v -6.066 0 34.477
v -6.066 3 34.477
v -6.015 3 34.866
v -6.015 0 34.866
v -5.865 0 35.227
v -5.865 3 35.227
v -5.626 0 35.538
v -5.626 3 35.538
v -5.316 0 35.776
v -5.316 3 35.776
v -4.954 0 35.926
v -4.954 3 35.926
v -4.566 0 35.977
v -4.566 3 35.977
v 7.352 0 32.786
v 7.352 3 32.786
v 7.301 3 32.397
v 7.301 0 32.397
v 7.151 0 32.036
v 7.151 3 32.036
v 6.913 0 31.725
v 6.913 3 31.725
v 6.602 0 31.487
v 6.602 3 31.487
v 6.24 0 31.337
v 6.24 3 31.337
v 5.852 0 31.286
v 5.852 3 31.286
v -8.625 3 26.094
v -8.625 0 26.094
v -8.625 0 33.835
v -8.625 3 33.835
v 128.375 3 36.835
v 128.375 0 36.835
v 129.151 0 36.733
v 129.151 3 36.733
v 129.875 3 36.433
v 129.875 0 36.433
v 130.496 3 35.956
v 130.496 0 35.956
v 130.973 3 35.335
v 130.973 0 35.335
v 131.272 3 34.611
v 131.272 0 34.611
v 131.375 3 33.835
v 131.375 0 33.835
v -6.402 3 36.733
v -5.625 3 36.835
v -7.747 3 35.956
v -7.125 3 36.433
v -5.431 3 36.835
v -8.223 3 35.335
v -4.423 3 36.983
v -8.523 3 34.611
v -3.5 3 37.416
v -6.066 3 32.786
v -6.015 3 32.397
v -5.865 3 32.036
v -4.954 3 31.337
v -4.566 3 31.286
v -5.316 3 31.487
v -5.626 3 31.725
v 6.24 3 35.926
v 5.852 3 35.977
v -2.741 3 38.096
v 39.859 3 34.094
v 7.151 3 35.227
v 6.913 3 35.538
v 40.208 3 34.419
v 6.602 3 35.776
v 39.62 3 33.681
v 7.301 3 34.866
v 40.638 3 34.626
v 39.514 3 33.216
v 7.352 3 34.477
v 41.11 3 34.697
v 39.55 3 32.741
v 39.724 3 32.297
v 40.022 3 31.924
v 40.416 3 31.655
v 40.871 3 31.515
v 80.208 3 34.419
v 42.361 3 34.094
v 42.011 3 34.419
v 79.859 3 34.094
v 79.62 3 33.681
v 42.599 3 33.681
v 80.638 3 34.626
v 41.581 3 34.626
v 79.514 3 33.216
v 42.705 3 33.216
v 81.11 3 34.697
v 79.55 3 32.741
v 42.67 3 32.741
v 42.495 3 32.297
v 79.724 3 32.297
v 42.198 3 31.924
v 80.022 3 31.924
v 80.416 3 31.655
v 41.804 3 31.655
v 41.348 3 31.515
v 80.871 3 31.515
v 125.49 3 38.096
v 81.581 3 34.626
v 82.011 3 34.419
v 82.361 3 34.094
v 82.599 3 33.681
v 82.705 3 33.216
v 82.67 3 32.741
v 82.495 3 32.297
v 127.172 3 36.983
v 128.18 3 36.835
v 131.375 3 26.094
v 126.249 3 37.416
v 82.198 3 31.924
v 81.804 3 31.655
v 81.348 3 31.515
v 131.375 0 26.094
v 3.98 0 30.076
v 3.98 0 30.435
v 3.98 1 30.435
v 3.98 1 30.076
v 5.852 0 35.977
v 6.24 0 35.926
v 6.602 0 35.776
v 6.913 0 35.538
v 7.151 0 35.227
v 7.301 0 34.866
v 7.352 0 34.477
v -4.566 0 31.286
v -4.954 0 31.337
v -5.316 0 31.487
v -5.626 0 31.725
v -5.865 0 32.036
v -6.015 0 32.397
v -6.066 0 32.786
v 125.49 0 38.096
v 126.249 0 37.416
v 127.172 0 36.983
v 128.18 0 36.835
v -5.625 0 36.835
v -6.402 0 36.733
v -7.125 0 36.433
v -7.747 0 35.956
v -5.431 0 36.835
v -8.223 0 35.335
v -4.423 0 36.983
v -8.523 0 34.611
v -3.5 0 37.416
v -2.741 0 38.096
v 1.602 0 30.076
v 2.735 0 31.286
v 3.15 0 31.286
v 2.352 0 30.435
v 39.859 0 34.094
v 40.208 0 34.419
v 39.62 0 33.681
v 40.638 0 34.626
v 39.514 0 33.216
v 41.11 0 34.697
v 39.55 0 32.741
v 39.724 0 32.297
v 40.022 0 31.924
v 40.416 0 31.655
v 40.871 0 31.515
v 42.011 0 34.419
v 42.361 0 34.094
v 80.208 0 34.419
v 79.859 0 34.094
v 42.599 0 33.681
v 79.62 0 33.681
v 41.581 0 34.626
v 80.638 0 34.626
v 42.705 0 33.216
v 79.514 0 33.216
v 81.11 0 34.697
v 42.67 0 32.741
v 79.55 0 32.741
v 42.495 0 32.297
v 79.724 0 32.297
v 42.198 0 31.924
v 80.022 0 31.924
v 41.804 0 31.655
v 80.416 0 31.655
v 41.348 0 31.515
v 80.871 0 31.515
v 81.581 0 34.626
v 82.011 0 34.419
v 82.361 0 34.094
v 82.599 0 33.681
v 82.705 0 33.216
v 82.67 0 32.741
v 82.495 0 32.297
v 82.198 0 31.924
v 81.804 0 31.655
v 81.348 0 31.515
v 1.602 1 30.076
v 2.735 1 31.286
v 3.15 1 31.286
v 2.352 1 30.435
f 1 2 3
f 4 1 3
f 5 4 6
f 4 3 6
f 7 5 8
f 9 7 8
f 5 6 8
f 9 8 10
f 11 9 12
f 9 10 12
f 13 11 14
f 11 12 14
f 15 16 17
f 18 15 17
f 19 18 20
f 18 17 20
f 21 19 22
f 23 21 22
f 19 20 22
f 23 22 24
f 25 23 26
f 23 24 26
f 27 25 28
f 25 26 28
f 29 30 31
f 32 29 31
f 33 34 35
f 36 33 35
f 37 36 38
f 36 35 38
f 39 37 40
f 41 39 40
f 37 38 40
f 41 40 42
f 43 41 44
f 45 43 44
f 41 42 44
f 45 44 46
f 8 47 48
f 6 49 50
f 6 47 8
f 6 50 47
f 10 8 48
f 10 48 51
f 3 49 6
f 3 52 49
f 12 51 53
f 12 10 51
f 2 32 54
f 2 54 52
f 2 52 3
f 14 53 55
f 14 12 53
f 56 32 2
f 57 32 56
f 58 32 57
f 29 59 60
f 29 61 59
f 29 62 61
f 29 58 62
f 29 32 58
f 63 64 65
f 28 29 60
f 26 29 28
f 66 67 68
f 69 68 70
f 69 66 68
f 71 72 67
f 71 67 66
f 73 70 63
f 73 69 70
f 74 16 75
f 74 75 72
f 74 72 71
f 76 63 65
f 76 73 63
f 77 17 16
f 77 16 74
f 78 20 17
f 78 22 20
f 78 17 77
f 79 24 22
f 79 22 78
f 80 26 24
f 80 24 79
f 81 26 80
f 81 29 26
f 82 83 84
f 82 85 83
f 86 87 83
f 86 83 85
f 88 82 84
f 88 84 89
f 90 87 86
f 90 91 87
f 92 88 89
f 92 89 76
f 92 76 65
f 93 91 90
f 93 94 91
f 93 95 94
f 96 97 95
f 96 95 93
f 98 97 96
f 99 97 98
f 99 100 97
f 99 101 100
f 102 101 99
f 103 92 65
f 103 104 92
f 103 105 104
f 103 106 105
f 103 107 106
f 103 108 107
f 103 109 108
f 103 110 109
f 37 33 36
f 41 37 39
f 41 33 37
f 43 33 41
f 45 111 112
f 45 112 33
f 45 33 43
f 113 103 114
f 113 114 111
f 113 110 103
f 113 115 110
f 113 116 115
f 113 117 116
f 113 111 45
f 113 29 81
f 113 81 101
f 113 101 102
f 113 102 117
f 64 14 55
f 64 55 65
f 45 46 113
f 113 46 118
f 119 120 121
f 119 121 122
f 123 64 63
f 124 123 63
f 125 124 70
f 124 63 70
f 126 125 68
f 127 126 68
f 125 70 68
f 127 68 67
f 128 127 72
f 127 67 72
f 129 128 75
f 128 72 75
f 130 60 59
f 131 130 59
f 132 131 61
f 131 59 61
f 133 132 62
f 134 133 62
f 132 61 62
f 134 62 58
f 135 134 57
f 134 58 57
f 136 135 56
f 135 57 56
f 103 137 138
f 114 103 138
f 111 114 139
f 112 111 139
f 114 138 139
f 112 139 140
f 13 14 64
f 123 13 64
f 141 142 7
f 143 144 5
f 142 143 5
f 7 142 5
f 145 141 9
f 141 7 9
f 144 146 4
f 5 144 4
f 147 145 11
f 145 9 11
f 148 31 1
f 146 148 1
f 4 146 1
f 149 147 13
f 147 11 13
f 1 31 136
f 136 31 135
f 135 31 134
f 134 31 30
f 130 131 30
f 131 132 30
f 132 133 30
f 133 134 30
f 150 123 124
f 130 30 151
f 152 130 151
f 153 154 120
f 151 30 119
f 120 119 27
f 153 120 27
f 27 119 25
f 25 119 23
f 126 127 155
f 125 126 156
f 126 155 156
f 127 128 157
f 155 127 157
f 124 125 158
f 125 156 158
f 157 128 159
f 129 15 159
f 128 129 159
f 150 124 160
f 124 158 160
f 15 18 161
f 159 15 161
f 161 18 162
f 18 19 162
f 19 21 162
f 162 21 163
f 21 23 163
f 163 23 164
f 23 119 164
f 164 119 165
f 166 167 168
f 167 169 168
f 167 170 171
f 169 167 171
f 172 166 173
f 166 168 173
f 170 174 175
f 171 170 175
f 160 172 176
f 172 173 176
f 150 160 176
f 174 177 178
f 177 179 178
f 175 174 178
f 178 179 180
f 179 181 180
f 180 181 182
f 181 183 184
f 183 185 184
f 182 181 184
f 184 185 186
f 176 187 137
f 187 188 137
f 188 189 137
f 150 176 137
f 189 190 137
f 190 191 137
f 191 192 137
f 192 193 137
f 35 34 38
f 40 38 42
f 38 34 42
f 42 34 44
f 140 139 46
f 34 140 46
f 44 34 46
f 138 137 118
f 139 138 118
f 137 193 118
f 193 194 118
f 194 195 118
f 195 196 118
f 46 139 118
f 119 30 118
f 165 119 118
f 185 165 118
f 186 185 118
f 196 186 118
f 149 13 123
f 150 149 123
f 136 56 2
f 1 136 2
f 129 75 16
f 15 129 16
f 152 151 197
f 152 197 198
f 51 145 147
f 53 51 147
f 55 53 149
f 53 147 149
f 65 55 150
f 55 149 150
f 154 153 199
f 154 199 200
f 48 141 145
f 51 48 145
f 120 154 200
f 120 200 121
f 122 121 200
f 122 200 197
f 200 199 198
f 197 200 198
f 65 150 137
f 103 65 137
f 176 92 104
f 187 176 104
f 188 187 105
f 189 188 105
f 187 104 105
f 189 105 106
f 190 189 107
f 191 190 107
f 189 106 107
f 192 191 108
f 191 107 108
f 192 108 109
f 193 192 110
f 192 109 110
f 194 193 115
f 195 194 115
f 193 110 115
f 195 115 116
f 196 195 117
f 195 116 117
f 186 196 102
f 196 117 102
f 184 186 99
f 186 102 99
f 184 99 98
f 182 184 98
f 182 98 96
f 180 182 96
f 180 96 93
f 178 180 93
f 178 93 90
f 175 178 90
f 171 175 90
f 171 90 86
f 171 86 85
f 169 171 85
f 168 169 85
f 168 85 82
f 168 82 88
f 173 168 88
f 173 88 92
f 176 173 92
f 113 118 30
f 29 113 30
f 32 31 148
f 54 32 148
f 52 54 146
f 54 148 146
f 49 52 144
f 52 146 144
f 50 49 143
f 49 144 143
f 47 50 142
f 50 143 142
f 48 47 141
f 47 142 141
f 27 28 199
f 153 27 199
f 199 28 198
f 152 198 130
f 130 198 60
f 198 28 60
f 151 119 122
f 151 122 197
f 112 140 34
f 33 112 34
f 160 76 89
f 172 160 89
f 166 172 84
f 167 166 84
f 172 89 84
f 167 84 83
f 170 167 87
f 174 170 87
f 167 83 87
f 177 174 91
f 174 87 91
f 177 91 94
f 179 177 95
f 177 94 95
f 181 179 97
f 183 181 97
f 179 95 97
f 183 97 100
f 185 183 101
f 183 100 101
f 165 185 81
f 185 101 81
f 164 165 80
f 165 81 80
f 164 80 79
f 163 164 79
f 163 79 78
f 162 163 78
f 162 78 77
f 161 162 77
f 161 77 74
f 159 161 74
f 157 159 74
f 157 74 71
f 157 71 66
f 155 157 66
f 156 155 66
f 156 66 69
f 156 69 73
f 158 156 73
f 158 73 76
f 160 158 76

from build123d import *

# Parameters (mm, degrees)
BOSS_EXTRUDE1_DEPTH = 3
CUT_EXTRUDE1_DEPTH  = 1
CUT_EXTRUDE3_REACH  = 138.82
CUT_EXTRUDE4_REACH  = 138.82


with BuildPart() as part:
    # Sketch3 → Boss-Extrude1 (new body)
    with BuildSketch(Plane(origin=(0, 0, 0), x_dir=(1, 0, 0), z_dir=(0, 1, 0))):
        with BuildLine():
            Line((131.37466785, -26.093767651), (-8.62533215, -26.093767651))
            Line((-8.62533215, -26.093767651), (-8.62533215, -33.834747513))
            ThreePointArc((-8.62533215, -33.834747513), (-7.746652493, -35.956067857), (-5.62533215, -36.834747513))
            Line((-5.62533215, -36.834747513), (-5.431022837, -36.834747513))
            ThreePointArc((-5.431022837, -36.834747513), (-3.945556452, -37.165616778), (-2.74094445, -38.095667731))
            Line((-2.74094445, -38.095667731), (125.49028015, -38.095667731))
            ThreePointArc((125.49028015, -38.095667731), (126.694892152, -37.165616778), (128.180358538, -36.834747513))
            Line((128.180358538, -36.834747513), (128.37466785, -36.834747513))
            ThreePointArc((128.37466785, -36.834747513), (130.495988194, -35.956067857), (131.37466785, -33.834747513))
            Line((131.37466785, -33.834747513), (131.37466785, -26.093767651))
        make_face()
    extrude(amount=BOSS_EXTRUDE1_DEPTH)

    # Sketch4 → Cut-Extrude1 (cut)
    with BuildSketch(Plane.XZ):
        with BuildLine():
            Line((2.050442501, 32.498814854), (1.736339937, 32.498814854))
            add(Edge.make_bspline(
                [(1.736339937, 32.498814854), (1.73838709, 32.540485742), (1.742407644, 32.622326256), (1.761235933, 32.741650163), (1.78817681, 32.855704962), (1.826268264, 32.963574876), (1.873574542, 33.066213683), (1.930304569, 33.163213699), (1.99749842, 33.254204887), (2.073705154, 33.338343731), (2.156473793, 33.415531301), (2.245779732, 33.482186544), (2.33962476, 33.538504215), (2.437724159, 33.585585457), (2.541184722, 33.620925303), (2.64906758, 33.647146943), (2.761846716, 33.662923289), (2.838686738, 33.664619074), (2.877766219, 33.665481521)],
                knots=[0, 0, 0, 0, 1.10065271, 2.161652631, 3.183658789, 4.190468796, 5.17591951, 6.163126047, 7.15150782, 8.156236427, 9.156009102, 10.134482811, 11.092018607, 12.041330605, 13.001268258, 13.972401359, 14.968799086, 16, 16, 16, 16], degree=3))
            add(Edge.make_bspline(
                [(2.877766219, 33.665481521), (2.916144293, 33.664583064), (2.991555837, 33.66281763), (3.101617852, 33.6476566), (3.206395146, 33.623911009), (3.305682913, 33.590595592), (3.398688977, 33.545811165), (3.486112022, 33.492013626), (3.568992833, 33.429793795), (3.643599616, 33.356539981), (3.712107696, 33.278337597), (3.771209951, 33.194849693), (3.821823114, 33.108620408), (3.864010794, 33.018992206), (3.895066933, 32.925121178), (3.918645141, 32.828373975), (3.931972555, 32.727749164), (3.934017978, 32.659642608), (3.935057885, 32.625016777)],
                knots=[0, 0, 0, 0, 1.111607364, 2.184268762, 3.212621178, 4.221274766, 5.211760367, 6.196651075, 7.1921475, 8.207485113, 9.220403448, 10.201281604, 11.166441695, 12.114753415, 13.065576456, 14.026450734, 14.996634279, 16, 16, 16, 16], degree=3))
            add(Edge.make_bspline(
                [(3.935057885, 32.625016777), (3.93337124, 32.576266968), (3.930027549, 32.47962284), (3.901171846, 32.337418482), (3.856589749, 32.199513423), (3.80251672, 32.088534371), (3.747896152, 31.999557478), (3.699716357, 31.925641836), (3.642064004, 31.84681542), (3.575466591, 31.762284311), (3.500928784, 31.671789941), (3.417914117, 31.575295175), (3.325788426, 31.47382487), (3.261130244, 31.404519057), (3.227625994, 31.368606521)],
                knots=[0, 0, 0, 0, 1.184203166, 2.347625244, 3.513805382, 4.700623107, 5.337941753, 6.051866363, 6.845199593, 7.711357327, 8.668078039, 9.695487809, 10.805859518, 12, 12, 12, 12], degree=3))
            Line((3.227625994, 31.368606521), (2.351924872, 30.43471229))
            Line((2.351924872, 30.43471229), (3.97992968, 30.43471229))
            Line((3.97992968, 30.43471229), (3.97992968, 30.075737931))
            Line((3.97992968, 30.075737931), (1.601724552, 30.075737931))
            Line((1.601724552, 30.075737931), (2.959096347, 31.524255559))
            add(Edge.make_bspline(
                [(2.959096347, 31.524255559), (2.992144234, 31.558753866), (3.055622461, 31.625018052), (3.145405038, 31.721761013), (3.226044026, 31.811510553), (3.298061419, 31.894097102), (3.359894924, 31.97072867), (3.414767156, 32.038923373), (3.458732747, 32.101677823), (3.506448143, 32.174418437), (3.552662124, 32.263230755), (3.59237448, 32.371764444), (3.616589329, 32.483491696), (3.619494164, 32.558993734), (3.620955321, 32.596971905)],
                knots=[0, 0, 0, 0, 1.329631726, 2.553950428, 3.673215718, 4.687767853, 5.603093632, 6.413772471, 7.123043292, 7.734684054, 8.834405432, 9.900288307, 10.943827018, 12, 12, 12, 12], degree=3))
            add(Edge.make_bspline(
                [(3.620955321, 32.596971905), (3.620319579, 32.620853304), (3.619066653, 32.667918954), (3.608008955, 32.736924713), (3.591298449, 32.803489527), (3.567353191, 32.867818146), (3.535746451, 32.929263798), (3.497273071, 32.987901278), (3.452883008, 33.044590244), (3.401531739, 33.097743542), (3.345120219, 33.146424747), (3.285525969, 33.189548833), (3.222475865, 33.225587943), (3.156235743, 33.255131441), (3.086990273, 33.278306822), (3.014605528, 33.294365401), (2.939281512, 33.304447885), (2.887848016, 33.305812057), (2.861640417, 33.306507162)],
                knots=[0, 0, 0, 0, 0.991446411, 1.95395049, 2.89581595, 3.838931463, 4.798493298, 5.75982156, 6.748411868, 7.785213223, 8.824556874, 9.840280684, 10.836137867, 11.835679398, 12.848801643, 13.863922112, 14.911575587, 16, 16, 16, 16], degree=3))
            add(Edge.make_bspline(
                [(2.861640417, 33.306507162), (2.834269585, 33.30579213), (2.780517788, 33.304387924), (2.701598755, 33.29456526), (2.626312978, 33.27761942), (2.554471075, 33.254442745), (2.485951489, 33.224984197), (2.421087445, 33.188292452), (2.360024556, 33.144508959), (2.302648033, 33.094868403), (2.249784053, 33.039600801), (2.203337178, 32.977990838), (2.162753163, 32.911163423), (2.12734393, 32.839298872), (2.09858824, 32.761745092), (2.076615089, 32.678777387), (2.059228243, 32.590756006), (2.053419722, 32.529970921), (2.050442501, 32.498814854)],
                knots=[0, 0, 0, 0, 1.031018746, 2.02475058, 2.990194455, 3.934040569, 4.864654155, 5.795059489, 6.735614925, 7.690564532, 8.649604399, 9.611025574, 10.590972636, 11.591080095, 12.624614302, 13.701020113, 14.821632451, 16, 16, 16, 16], degree=3))
        make_face()
    extrude(amount=-CUT_EXTRUDE1_DEPTH, mode=Mode.SUBTRACT)

    # Sketch5 → Cut-Extrude3 (cut, up to next)
    with BuildSketch(Plane(origin=(0, 3, 0), x_dir=(1, 0, 0), z_dir=(0, 1, 0)), mode=Mode.PRIVATE) as cut_extrude3_sk1:
        with BuildLine():
            Line((-4.565790678, -35.977380503), (5.852113338, -35.977380503))
            ThreePointArc((5.852113338, -35.977380503), (6.91277351, -35.538040675), (7.352113338, -34.477380503))
            Line((7.352113338, -34.477380503), (7.352113338, -32.785571201))
            ThreePointArc((7.352113338, -32.785571201), (6.91277351, -31.724911029), (5.852113338, -31.285571201))
            Line((5.852113338, -31.285571201), (-4.565790678, -31.285571201))
            ThreePointArc((-4.565790678, -31.285571201), (-5.62645085, -31.724911029), (-6.065790678, -32.785571201))
            Line((-6.065790678, -32.785571201), (-6.065790678, -34.477380503))
            ThreePointArc((-6.065790678, -34.477380503), (-5.62645085, -35.538040675), (-4.565790678, -35.977380503))
        make_face()
    cut_extrude3_tool1 = extrude(cut_extrude3_sk1.sketch, amount=-CUT_EXTRUDE3_REACH, mode=Mode.PRIVATE) & part.part
    add(cut_extrude3_tool1.solids().sort_by_distance((0.643161, 3, 33.631476))[0], mode=Mode.SUBTRACT)

    # Sketch6 → Cut-Extrude4 (cut, up to next)
    with BuildSketch(Plane(origin=(0, 3, 0), x_dir=(1, 0, 0), z_dir=(0, 1, 0)), mode=Mode.PRIVATE) as cut_extrude4_sk1:
        with BuildLine():
            ThreePointArc((41.109797099, -31.496885933), (39.509797099, -33.096885933), (41.109797099, -34.696885933))
            ThreePointArc((41.109797099, -34.696885933), (42.709797099, -33.096885933), (41.109797099, -31.496885933))
        make_face()
    cut_extrude4_tool1 = extrude(cut_extrude4_sk1.sketch, amount=-CUT_EXTRUDE4_REACH, mode=Mode.PRIVATE) & part.part
    # Sketch6 → Cut-Extrude4 (cut, up to next)
    with BuildSketch(Plane(origin=(0, 3, 0), x_dir=(1, 0, 0), z_dir=(0, 1, 0)), mode=Mode.PRIVATE) as cut_extrude4_sk2:
        with BuildLine():
            ThreePointArc((81.109797099, -31.496885933), (79.509797099, -33.096885933), (81.109797099, -34.696885933))
            ThreePointArc((81.109797099, -34.696885933), (82.709797099, -33.096885933), (81.109797099, -31.496885933))
        make_face()
    cut_extrude4_tool2 = extrude(cut_extrude4_sk2.sketch, amount=-CUT_EXTRUDE4_REACH, mode=Mode.PRIVATE) & part.part
    add(cut_extrude4_tool1.solids().sort_by_distance((41.109797, 3, 33.096886))[0], mode=Mode.SUBTRACT)
    add(cut_extrude4_tool2.solids().sort_by_distance((81.109797, 3, 33.096886))[0], mode=Mode.SUBTRACT)


solid = part.part
